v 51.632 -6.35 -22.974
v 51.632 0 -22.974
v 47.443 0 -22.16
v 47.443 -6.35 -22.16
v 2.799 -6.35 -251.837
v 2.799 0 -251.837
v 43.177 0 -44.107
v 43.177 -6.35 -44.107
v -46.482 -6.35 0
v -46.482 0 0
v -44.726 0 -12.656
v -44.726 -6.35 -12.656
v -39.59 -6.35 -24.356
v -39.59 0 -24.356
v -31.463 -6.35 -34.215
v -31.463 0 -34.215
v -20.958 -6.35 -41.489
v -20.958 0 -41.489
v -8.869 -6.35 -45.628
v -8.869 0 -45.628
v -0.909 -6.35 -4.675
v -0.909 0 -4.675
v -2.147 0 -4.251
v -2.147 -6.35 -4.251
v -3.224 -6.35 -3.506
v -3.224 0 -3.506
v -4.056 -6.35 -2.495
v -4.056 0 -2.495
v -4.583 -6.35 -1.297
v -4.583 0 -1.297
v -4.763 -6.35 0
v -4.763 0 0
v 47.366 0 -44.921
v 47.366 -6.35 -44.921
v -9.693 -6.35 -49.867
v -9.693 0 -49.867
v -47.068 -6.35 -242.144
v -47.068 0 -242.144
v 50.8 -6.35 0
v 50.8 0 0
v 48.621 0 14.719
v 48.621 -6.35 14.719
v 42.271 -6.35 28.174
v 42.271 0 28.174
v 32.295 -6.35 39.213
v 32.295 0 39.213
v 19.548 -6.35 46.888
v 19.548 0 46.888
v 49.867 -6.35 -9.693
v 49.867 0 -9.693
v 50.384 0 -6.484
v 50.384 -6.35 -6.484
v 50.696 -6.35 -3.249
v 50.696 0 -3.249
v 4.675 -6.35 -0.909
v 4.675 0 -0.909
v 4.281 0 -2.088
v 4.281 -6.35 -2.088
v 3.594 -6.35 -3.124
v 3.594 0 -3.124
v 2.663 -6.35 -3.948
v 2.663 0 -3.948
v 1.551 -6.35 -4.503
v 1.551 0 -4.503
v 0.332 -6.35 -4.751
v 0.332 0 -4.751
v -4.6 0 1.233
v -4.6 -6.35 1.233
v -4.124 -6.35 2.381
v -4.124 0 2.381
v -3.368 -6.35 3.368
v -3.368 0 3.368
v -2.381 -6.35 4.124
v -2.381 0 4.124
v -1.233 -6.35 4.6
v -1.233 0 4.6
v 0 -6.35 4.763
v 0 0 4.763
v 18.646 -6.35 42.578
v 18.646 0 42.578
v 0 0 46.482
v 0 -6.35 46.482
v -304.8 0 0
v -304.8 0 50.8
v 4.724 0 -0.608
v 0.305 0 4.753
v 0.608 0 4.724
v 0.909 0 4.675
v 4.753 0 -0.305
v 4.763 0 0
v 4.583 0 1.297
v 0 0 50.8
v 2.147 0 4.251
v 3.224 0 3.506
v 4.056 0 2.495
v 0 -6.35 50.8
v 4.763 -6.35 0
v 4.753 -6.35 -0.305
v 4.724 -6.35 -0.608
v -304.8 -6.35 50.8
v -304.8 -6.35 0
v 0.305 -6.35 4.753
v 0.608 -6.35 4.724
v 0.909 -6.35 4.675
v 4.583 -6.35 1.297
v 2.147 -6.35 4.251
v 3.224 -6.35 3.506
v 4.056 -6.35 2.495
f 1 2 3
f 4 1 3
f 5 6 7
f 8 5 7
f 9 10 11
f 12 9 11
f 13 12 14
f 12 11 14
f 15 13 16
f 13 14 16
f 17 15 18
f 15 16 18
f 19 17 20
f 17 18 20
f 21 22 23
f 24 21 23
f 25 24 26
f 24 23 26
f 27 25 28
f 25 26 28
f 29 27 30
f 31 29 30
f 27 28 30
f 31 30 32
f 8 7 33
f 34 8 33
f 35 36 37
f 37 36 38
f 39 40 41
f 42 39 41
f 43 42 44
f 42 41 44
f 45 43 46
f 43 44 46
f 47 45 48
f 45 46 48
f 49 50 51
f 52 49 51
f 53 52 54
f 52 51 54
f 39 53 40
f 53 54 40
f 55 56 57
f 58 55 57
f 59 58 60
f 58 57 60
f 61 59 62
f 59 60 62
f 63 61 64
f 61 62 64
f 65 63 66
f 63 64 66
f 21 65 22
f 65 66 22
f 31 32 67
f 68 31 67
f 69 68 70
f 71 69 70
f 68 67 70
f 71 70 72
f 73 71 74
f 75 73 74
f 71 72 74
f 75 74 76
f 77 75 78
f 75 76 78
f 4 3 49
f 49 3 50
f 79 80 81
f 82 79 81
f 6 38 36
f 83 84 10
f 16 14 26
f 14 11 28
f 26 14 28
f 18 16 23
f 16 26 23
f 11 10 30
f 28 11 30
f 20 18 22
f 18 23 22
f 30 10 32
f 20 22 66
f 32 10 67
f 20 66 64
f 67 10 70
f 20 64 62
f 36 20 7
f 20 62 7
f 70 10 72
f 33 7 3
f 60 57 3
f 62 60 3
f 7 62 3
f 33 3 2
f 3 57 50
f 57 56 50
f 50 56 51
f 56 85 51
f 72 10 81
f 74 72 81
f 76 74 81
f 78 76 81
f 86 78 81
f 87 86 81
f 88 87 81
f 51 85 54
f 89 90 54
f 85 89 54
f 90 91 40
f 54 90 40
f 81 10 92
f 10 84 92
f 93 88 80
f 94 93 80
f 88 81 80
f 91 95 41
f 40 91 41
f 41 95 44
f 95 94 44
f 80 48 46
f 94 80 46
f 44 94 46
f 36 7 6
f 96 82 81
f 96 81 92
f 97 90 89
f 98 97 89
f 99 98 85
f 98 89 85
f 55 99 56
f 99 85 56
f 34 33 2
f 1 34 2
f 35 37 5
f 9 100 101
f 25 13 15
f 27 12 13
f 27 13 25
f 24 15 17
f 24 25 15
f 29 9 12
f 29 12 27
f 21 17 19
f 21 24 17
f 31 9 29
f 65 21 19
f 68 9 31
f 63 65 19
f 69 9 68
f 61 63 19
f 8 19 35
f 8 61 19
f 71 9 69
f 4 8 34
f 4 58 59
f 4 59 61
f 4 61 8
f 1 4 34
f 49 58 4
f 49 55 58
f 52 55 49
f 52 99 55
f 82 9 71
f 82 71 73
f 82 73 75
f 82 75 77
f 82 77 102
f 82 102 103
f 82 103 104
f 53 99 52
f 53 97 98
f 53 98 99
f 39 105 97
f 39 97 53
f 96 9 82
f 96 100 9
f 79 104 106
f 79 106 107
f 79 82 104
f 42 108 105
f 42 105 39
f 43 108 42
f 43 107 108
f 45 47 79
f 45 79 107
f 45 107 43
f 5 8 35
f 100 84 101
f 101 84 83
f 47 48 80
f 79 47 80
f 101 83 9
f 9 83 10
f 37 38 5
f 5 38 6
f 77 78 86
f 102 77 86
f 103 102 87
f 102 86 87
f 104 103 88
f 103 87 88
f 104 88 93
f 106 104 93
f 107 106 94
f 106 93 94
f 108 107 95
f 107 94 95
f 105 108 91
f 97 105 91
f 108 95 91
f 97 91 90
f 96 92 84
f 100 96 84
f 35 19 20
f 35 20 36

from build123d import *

# Parameters (mm, degrees)
F1_DEPTH = 6.35


with BuildPart() as f1:
    # F0 (on Front) → F1 (new body)
    with BuildSketch(Plane.XZ):
        with BuildLine():
            ThreePointArc((-50.8, 0), (-35.9210244843, 35.9210244843), (0, 50.8))
            Line((0, 50.8), (-304.8, 50.8))
            Line((-304.8, 50.8), (-304.8, 0))
            Line((-304.8, 0), (-50.8, 0))
        make_face()
        Polygon((51.6320080606, -22.9739477141), (46.3118022943, -27.9812591796), (43.1772616128, -44.1070730311), (47.3658829955, -44.9212585503), align=None)
        Polygon((51.6320080606, -22.9739477141), (47.4433866779, -22.1597621949), (46.3118022943, -27.9812591796), align=None)
        with BuildLine():
            Line((46.482, 0), (50.8, 0))
            ThreePointArc((50.8, 0), (42.2710462755, 28.1744325014), (19.5480847725, 46.8882968525))
            Line((19.5480847725, 46.8882968525), (18.6457425678, 42.5783114754))
            ThreePointArc((18.6457425678, 42.5783114754), (38.905447755, 25.4350635734), (46.482, 0))
        make_face()
        with BuildLine():
            Line((47.4433866779, -22.1597621949), (49.8666609191, -9.6930969651))
            ThreePointArc((49.8666609191, -9.6930969651), (28.4069994963, -42.1151086858), (-9.6930969651, -49.8666609191))
            Line((-9.6930969651, -49.8666609191), (-47.0680440019, -242.1440947937))
            Line((-47.0680440019, -242.1440947937), (2.7986169173, -251.8371917588))
            Line((2.7986169173, -251.8371917588), (43.1772616128, -44.1070730311))
            Line((43.1772616128, -44.1070730311), (46.3118022943, -27.9812591796))
            Line((46.3118022943, -27.9812591796), (47.4433866779, -22.1597621949))
        make_face()
        with BuildLine():
            ThreePointArc((49.8666609191, -9.6930969651), (50.5661268771, -4.868964228), (50.8, 0))
            Line((50.8, 0), (46.482, 0))
            ThreePointArc((46.482, 0), (46.2680060925, -4.4551022686), (45.627994741, -8.8691837231))
            Line((45.627994741, -8.8691837231), (49.8666609191, -9.6930969651))
        make_face()
        with BuildLine():
            Line((0, 46.482), (0, 50.8))
            ThreePointArc((0, 50.8), (-35.9210244843, 35.9210244843), (-50.8, 0))
            Line((-50.8, 0), (-46.482, 0))
            ThreePointArc((-46.482, 0), (-32.8677374031, 32.8677374031), (0, 46.482))
        make_face()
        with BuildLine():
            ThreePointArc((-9.6930969651, -49.8666609191), (28.4069994963, -42.1151086858), (49.8666609191, -9.6930969651))
            Line((49.8666609191, -9.6930969651), (45.627994741, -8.8691837231))
            ThreePointArc((45.627994741, -8.8691837231), (25.9924045391, -38.5353244475), (-8.8691837231, -45.627994741))
            Line((-8.8691837231, -45.627994741), (-9.6930969651, -49.8666609191))
        make_face()
        with BuildLine():
            Line((4.7625, 0), (46.482, 0))
            ThreePointArc((46.482, 0), (38.905447755, 25.4350635734), (18.6457425678, 42.5783114754))
            Line((18.6457425678, 42.5783114754), (0, 46.482))
            Line((0, 46.482), (0, 4.7625))
            ThreePointArc((0, 4.7625), (0.4564653964, 4.7405743947), (0.9087278405, 4.6749994612))
            ThreePointArc((0.9087278405, 4.6749994612), (3.6748620784, 3.0293225241), (4.7625, 0))
        make_face()
        with BuildLine():
            Line((0, 4.7625), (0, 46.482))
            ThreePointArc((0, 46.482), (-32.8677374031, 32.8677374031), (-46.482, 0))
            Line((-46.482, 0), (-4.7625, 0))
            ThreePointArc((-4.7625, 0), (-3.3675960454, 3.3675960454), (0, 4.7625))
        make_face()
        with BuildLine():
            ThreePointArc((-46.482, 0), (-35.866653885, -29.566187835), (-8.8691837231, -45.627994741))
            Line((-8.8691837231, -45.627994741), (-0.9087278405, -4.6749994612))
            ThreePointArc((-0.9087278405, -4.6749994612), (-3.6748620784, -3.0293225241), (-4.7625, 0))
            Line((-4.7625, 0), (-46.482, 0))
        make_face()
        with BuildLine():
            ThreePointArc((-8.8691837231, -45.627994741), (25.9924045391, -38.5353244475), (45.627994741, -8.8691837231))
            Line((45.627994741, -8.8691837231), (4.6749994612, -0.9087278405))
            ThreePointArc((4.6749994612, -0.9087278405), (2.6631562028, -3.9482914393), (-0.9087278405, -4.6749994612))
            Line((-0.9087278405, -4.6749994612), (-8.8691837231, -45.627994741))
        make_face()
        with BuildLine():
            ThreePointArc((45.627994741, -8.8691837231), (46.2680060925, -4.4551022686), (46.482, 0))
            Line((46.482, 0), (4.7625, 0))
            ThreePointArc((4.7625, 0), (4.7405743947, -0.4564653964), (4.6749994612, -0.9087278405))
            Line((4.6749994612, -0.9087278405), (45.627994741, -8.8691837231))
        make_face()
    extrude(amount=F1_DEPTH)


solid = f1.part
